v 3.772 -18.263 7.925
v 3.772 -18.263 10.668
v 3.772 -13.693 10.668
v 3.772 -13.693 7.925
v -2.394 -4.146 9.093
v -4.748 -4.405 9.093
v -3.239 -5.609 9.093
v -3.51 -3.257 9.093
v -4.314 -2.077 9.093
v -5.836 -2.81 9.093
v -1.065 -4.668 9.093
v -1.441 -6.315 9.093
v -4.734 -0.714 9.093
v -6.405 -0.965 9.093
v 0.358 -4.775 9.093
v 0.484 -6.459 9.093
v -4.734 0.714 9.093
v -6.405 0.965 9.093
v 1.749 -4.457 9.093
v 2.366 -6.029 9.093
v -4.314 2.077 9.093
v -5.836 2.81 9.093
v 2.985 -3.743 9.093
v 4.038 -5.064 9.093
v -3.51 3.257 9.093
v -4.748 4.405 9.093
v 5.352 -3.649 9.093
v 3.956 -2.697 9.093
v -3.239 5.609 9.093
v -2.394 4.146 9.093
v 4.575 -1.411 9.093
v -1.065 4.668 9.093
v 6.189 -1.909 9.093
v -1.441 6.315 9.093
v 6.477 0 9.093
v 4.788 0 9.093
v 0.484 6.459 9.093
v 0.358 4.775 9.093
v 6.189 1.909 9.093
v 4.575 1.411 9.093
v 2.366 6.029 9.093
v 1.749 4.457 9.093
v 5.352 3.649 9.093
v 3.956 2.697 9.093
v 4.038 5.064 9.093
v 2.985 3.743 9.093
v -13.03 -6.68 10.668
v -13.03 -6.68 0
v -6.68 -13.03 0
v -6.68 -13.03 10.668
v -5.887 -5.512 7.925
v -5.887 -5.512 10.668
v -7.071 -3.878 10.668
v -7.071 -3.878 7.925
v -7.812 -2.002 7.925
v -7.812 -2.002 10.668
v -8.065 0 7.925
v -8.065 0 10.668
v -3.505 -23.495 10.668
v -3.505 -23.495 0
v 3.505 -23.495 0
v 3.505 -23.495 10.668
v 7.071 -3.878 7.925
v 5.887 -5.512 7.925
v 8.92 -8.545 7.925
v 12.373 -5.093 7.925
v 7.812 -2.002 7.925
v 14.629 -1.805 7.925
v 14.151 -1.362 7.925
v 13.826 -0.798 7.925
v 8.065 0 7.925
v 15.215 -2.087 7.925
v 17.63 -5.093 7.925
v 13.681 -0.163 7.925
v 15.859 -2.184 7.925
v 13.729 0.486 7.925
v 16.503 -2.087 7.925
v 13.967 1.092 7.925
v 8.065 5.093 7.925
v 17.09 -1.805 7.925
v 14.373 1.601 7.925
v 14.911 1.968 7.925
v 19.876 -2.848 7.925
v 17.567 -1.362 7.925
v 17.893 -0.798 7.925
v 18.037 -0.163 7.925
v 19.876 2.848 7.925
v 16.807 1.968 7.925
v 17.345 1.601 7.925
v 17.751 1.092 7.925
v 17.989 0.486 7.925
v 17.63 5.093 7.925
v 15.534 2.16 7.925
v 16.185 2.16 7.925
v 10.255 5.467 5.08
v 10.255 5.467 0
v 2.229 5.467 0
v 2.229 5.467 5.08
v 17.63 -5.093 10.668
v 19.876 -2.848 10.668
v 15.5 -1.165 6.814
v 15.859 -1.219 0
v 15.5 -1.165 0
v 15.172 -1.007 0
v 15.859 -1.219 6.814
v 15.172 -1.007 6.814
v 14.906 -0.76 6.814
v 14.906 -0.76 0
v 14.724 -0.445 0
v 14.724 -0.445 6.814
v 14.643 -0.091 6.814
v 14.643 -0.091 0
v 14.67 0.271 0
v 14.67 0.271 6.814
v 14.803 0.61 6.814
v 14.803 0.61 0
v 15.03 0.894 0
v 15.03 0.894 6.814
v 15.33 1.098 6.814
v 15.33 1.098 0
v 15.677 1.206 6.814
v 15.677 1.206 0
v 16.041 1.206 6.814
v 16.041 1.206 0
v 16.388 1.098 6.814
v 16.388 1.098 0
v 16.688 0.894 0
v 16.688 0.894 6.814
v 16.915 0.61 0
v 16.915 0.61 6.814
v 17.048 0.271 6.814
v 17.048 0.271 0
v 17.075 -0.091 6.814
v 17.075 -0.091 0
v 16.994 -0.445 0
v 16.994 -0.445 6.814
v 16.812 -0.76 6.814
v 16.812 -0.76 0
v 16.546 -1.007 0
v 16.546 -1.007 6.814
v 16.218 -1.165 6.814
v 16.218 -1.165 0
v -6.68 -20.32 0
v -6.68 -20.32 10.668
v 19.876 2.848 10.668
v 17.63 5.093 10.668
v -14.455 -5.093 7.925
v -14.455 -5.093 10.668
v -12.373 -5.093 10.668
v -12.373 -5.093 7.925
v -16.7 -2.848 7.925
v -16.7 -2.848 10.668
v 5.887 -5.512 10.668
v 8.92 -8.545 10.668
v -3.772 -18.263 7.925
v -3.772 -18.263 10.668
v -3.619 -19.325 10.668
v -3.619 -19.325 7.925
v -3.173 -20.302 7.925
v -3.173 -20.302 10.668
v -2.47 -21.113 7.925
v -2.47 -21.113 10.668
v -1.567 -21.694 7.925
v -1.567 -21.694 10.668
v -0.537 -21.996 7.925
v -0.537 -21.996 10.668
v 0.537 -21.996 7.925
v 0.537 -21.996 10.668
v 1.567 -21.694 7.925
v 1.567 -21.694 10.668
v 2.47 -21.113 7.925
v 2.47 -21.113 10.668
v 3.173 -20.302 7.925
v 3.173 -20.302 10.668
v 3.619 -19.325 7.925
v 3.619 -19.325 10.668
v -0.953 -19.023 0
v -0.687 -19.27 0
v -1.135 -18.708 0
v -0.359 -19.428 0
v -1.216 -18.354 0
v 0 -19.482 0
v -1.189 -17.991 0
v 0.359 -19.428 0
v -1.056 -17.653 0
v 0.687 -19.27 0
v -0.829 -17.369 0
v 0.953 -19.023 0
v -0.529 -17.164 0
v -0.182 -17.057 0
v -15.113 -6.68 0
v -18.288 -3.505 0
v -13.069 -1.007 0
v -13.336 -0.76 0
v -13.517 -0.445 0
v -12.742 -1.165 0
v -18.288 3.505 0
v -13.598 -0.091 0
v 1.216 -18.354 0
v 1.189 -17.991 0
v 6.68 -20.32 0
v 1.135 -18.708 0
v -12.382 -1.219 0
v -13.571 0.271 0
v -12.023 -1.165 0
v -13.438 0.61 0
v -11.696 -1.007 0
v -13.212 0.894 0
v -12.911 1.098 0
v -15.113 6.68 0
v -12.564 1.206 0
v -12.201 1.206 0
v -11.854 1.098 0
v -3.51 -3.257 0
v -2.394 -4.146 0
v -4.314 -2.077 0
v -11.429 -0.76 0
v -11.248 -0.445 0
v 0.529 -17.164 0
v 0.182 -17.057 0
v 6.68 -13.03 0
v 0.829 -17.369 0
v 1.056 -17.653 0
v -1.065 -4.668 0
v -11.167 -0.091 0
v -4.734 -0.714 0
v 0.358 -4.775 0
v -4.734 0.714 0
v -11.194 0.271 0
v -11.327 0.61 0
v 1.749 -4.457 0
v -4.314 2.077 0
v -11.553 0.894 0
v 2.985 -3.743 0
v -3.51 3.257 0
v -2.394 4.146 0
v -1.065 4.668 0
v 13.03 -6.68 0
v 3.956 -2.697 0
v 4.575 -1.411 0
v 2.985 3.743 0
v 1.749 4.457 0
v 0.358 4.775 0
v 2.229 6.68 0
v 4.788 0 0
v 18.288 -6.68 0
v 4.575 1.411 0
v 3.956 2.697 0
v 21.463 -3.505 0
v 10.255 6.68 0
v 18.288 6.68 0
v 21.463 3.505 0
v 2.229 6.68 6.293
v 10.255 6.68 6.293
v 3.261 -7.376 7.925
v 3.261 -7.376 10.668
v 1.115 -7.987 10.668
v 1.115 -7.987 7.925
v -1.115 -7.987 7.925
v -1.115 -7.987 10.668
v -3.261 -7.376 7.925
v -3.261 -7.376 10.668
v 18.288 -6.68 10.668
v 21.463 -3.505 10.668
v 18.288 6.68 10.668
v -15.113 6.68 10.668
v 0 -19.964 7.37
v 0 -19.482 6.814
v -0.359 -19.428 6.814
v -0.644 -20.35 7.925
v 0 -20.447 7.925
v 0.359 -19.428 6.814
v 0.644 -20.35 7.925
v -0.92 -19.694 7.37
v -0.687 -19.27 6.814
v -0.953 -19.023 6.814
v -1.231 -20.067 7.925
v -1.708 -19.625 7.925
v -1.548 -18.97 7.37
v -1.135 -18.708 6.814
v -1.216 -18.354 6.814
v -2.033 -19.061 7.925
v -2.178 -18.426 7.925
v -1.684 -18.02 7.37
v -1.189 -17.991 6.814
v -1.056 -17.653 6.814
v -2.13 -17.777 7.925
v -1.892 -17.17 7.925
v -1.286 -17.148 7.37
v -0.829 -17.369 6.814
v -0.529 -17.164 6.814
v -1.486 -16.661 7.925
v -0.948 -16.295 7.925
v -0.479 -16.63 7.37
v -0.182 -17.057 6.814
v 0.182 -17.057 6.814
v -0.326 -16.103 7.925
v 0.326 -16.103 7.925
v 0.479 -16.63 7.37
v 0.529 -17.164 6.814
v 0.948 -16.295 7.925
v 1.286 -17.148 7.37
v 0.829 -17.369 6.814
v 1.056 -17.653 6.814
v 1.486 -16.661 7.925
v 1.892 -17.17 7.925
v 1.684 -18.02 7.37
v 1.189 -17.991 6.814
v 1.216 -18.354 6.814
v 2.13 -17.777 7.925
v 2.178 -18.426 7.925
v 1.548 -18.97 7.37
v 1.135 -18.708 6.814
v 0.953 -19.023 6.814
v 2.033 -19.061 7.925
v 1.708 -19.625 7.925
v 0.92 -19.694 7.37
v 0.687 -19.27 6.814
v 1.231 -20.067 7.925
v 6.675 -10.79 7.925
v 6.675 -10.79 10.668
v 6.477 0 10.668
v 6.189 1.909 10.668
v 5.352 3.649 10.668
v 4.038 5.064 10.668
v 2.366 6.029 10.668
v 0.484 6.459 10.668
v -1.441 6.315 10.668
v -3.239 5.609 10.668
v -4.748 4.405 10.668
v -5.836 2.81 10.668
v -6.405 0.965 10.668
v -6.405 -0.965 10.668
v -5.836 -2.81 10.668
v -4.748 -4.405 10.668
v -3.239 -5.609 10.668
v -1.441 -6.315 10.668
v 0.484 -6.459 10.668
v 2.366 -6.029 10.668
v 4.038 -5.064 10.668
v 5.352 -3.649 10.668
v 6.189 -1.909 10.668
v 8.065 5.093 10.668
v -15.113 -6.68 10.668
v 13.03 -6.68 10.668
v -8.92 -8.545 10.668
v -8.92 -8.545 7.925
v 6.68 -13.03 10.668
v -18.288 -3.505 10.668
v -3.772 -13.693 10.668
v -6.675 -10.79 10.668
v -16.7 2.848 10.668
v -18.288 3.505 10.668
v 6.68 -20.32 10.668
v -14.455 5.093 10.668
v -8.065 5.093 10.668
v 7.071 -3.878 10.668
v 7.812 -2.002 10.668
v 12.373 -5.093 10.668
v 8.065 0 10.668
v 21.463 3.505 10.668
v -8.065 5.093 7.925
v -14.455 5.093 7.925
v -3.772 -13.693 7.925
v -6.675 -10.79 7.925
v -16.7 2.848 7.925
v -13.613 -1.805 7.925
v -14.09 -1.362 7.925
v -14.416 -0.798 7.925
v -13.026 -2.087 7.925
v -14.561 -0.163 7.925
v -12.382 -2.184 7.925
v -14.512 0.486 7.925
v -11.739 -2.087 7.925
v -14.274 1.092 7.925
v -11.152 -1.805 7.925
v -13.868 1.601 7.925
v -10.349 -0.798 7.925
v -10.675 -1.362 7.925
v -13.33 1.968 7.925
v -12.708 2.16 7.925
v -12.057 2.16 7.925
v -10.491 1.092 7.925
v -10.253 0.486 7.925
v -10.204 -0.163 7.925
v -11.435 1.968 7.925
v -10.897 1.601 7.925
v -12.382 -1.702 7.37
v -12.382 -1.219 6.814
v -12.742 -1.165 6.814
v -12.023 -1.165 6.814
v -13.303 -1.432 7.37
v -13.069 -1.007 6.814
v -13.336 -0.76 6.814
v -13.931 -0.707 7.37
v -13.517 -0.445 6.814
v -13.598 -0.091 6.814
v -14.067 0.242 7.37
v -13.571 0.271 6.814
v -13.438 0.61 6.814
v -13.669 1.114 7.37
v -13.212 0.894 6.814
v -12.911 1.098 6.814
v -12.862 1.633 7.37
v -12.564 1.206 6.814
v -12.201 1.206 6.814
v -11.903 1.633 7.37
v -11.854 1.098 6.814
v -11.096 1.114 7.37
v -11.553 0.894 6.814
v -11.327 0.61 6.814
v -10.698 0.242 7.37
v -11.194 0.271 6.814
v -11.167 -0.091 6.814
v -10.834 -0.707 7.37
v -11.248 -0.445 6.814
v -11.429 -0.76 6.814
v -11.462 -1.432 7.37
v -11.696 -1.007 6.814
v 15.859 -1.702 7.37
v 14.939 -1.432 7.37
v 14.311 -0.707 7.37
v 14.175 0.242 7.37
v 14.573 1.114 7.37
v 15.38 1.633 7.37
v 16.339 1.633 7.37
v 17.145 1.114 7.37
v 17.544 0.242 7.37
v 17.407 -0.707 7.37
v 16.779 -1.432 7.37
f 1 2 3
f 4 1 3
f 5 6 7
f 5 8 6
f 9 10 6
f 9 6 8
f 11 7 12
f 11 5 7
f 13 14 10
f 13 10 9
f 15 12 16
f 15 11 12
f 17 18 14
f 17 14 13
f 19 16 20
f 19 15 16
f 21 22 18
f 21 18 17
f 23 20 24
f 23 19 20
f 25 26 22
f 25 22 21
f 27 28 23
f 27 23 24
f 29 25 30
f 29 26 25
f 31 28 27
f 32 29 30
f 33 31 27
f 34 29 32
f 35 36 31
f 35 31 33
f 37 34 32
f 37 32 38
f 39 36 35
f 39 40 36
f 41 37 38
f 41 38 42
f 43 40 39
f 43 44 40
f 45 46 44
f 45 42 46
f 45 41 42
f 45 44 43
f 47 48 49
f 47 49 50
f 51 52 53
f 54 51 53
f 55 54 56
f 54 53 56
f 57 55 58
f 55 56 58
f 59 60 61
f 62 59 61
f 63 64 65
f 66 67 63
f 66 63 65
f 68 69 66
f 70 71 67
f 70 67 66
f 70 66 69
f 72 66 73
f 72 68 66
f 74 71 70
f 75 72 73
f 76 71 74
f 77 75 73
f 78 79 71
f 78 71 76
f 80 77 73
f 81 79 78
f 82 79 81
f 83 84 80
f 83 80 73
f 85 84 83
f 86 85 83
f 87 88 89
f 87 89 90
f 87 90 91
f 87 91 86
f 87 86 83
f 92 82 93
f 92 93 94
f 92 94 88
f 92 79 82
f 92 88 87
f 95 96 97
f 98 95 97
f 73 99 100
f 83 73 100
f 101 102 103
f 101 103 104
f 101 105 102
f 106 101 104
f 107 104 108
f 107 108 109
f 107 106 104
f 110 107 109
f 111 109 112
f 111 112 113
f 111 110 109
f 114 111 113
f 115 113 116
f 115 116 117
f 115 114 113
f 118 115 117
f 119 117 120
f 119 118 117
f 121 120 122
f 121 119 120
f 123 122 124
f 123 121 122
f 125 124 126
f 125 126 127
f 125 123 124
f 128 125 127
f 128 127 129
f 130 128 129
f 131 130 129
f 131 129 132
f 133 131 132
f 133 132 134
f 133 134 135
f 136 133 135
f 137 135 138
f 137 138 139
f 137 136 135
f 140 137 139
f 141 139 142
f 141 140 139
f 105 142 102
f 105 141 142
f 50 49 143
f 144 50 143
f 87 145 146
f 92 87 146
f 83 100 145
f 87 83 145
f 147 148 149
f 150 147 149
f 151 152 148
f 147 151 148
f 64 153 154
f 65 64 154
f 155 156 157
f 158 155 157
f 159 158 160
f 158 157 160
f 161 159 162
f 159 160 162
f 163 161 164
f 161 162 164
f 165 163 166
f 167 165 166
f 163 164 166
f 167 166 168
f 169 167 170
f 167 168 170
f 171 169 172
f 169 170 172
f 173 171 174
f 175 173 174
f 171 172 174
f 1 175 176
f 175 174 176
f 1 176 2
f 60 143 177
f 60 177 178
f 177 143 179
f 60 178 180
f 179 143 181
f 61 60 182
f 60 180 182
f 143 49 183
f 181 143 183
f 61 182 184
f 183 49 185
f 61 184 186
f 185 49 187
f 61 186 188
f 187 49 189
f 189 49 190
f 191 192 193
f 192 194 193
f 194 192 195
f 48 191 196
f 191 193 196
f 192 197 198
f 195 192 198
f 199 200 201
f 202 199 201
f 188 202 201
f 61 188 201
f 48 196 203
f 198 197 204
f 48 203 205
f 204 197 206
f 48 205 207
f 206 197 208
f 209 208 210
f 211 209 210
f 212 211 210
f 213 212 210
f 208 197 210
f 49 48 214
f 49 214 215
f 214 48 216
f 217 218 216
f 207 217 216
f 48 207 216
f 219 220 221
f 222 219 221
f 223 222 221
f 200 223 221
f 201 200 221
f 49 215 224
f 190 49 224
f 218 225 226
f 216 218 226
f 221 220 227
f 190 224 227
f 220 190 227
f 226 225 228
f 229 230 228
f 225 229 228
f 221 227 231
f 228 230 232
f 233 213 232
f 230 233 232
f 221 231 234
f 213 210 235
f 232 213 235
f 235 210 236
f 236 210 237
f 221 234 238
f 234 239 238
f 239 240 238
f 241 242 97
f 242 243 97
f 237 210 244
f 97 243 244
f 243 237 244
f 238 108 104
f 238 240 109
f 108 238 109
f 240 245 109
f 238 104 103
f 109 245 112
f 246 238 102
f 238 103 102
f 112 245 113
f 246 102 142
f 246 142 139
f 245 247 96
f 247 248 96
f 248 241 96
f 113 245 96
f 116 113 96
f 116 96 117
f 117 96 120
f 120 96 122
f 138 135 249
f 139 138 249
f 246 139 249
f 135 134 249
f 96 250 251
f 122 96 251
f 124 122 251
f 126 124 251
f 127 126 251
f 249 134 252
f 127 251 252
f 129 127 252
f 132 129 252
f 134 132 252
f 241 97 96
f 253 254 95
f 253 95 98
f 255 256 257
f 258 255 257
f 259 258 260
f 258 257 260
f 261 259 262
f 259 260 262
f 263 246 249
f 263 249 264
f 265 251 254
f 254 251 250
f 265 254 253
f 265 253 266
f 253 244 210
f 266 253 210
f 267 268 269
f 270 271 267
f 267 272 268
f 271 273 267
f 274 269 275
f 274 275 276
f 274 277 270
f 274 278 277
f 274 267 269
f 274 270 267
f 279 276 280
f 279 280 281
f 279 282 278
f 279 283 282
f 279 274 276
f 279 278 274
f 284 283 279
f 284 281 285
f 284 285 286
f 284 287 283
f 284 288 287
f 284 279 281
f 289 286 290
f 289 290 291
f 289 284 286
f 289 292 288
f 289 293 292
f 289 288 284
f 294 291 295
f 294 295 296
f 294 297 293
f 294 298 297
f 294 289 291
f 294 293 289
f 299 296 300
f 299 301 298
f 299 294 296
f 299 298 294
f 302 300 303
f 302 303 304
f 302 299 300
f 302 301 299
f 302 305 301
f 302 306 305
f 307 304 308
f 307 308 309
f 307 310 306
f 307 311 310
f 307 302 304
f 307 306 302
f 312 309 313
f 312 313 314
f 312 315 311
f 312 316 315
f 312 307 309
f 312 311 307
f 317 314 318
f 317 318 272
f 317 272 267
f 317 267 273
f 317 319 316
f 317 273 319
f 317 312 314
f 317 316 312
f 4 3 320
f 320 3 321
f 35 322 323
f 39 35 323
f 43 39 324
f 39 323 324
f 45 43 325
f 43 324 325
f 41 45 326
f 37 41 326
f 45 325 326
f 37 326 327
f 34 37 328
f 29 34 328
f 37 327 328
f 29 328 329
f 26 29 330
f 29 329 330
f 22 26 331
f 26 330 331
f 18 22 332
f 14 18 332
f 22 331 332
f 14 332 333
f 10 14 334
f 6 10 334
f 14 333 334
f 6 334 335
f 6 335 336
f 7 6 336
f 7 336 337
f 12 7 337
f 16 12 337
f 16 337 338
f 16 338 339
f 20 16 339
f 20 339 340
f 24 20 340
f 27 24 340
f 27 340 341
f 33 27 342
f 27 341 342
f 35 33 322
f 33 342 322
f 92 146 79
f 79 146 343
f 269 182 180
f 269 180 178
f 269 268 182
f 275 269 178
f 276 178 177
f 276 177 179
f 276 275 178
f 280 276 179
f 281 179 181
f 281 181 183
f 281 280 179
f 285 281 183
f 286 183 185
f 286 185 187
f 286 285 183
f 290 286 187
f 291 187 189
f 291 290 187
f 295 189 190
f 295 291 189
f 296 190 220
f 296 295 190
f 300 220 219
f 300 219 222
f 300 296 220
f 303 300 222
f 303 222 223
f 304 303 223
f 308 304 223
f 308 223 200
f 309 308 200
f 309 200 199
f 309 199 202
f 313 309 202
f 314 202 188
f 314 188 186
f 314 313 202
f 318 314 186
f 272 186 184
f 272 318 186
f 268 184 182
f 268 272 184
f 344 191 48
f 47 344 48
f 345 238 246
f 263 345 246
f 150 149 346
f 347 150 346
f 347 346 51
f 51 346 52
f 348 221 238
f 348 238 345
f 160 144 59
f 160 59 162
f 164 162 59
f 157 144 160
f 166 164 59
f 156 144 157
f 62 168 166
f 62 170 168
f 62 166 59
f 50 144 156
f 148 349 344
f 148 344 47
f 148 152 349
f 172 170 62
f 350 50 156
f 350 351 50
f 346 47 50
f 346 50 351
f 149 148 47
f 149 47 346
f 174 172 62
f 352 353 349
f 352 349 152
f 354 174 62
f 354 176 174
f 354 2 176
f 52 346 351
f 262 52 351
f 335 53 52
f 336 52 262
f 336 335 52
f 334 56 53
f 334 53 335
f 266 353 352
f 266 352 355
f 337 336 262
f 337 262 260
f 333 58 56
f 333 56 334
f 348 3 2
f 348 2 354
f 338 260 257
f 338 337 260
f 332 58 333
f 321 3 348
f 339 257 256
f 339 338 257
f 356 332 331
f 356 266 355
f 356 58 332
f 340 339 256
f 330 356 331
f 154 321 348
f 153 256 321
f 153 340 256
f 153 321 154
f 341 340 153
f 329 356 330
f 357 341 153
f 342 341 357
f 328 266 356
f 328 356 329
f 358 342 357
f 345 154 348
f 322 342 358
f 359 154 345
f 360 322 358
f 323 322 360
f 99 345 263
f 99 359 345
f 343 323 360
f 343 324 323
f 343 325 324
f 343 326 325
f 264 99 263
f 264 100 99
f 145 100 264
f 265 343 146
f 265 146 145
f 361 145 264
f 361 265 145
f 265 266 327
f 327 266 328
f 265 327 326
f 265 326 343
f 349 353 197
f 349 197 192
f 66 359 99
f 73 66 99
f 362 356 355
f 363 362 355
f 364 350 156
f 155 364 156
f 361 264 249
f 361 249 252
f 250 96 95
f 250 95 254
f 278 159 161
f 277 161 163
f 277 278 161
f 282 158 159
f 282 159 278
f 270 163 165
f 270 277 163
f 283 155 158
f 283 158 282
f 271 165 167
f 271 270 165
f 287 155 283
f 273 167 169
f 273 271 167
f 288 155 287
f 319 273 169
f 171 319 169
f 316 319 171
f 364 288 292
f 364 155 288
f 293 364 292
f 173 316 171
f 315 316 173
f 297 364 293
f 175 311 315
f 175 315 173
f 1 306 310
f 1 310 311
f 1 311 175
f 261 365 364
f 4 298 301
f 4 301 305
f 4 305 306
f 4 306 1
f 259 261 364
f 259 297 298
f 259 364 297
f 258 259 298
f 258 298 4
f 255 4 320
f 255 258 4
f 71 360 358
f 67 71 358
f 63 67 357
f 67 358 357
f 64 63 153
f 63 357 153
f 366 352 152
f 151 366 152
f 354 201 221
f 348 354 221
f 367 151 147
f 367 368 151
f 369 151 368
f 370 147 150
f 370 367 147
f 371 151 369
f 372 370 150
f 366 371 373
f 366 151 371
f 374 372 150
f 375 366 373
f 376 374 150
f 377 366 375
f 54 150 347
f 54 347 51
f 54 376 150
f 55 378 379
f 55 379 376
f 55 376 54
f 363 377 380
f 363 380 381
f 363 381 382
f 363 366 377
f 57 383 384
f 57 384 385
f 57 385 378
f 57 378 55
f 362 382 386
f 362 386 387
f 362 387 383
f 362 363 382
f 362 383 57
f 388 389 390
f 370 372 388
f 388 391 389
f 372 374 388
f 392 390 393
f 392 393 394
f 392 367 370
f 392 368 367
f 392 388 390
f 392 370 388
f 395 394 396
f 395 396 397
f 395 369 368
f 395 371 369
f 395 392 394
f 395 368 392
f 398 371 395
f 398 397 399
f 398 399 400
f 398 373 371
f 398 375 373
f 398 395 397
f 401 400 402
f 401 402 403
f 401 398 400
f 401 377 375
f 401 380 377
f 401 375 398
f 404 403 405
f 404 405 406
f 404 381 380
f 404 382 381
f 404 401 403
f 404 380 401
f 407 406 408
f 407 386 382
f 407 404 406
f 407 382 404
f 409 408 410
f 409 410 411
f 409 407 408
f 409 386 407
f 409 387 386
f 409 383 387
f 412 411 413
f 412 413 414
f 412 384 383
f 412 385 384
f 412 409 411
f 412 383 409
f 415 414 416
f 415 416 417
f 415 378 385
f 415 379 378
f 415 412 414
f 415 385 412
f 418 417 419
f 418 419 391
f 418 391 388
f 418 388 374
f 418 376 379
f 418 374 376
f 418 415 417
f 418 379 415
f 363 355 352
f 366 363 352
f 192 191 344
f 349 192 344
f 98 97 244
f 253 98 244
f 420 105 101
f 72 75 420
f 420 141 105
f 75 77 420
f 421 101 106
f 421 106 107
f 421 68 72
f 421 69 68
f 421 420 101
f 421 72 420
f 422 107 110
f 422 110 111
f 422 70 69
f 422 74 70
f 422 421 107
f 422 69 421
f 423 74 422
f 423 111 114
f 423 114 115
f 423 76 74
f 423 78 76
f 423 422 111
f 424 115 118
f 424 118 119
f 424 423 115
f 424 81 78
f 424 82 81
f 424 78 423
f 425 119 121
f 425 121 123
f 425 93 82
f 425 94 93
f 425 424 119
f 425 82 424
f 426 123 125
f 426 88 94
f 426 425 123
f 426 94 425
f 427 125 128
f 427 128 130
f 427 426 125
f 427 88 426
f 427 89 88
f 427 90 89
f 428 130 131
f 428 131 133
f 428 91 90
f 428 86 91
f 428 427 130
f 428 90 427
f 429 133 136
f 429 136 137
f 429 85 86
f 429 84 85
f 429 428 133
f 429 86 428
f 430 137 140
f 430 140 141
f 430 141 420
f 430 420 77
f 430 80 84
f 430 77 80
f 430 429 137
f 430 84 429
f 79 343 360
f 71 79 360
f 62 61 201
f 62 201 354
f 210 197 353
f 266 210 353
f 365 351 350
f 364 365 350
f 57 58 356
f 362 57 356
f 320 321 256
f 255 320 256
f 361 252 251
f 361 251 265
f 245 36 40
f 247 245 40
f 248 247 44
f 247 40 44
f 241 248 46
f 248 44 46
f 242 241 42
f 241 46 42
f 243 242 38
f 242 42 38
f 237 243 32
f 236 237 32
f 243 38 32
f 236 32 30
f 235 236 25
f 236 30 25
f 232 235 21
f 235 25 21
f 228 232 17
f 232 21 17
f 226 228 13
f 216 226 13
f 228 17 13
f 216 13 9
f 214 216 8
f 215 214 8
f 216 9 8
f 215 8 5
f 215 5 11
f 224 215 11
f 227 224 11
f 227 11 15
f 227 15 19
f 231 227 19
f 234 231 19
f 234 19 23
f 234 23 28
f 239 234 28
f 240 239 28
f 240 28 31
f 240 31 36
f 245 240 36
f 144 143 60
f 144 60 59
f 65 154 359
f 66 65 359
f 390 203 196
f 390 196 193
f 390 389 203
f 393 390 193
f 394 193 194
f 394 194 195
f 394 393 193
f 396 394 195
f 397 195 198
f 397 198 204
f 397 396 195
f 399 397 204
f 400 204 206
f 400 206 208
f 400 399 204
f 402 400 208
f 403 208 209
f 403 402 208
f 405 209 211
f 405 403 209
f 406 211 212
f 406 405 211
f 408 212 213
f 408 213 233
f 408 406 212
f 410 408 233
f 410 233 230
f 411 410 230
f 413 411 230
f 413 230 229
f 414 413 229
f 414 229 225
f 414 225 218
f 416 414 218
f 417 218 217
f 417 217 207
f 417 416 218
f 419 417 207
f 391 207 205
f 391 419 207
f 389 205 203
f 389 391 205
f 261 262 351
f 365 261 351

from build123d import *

# Parameters (mm, degrees)
BOSS_EXTRUDE1_DEPTH                           = 10.668
CSK_FOR_2_FLAT_HEAD_MACHINE_SCREW1_AT_2_COUNT = 2
CSK_FOR_2_FLAT_HEAD_MACHINE_SCREW1_AT_2_PITCH = 28.241625
CSK_FOR_2_FLAT_HEAD_MACHINE_SCREW1_AT_3_COUNT = 2
CSK_FOR_2_FLAT_HEAD_MACHINE_SCREW1_AT_3_PITCH = 24.18748446
SKETCH4_R                                     = 6.477
CUT_EXTRUDE1_DEPTH                            = 1.5748
SKETCH5_R                                     = 4.7879
CUT_EXTRUDE2_DEPTH                            = 11.668
SKETCH6_W                                     = 8.0264
SKETCH6_H                                     = 10.033
CUT_EXTRUDE3_DEPTH                            = 5.08
DRAFT2_ANGLE                                  = 45
CHAMFER1_SIZE                                 = 3.175
CHAMFER2_SIZE                                 = 6.35
CUT_EXTRUDE4_DEPTH                            = 2.7432


with BuildPart() as part:
    # Sketch1 → Boss-Extrude1 (new body)
    with BuildSketch(Plane.XY):
        Polygon((21.463, 6.6802), (-18.288, 6.6802), (-18.288, -6.6802), (-6.6802, -6.6802), (-6.6802, -23.495), (6.6802, -23.495), (6.6802, -6.6802), (21.463, -6.6802), align=None)
    extrude(amount=BOSS_EXTRUDE1_DEPTH)

    # Sketch3 → CSK for #2 Flat Head Machine Screw1 (revolve, cut)
    with BuildSketch(Plane(origin=(15.859125, 0, 10.668), x_dir=(0, -1, 0), z_dir=(1, 0, 0))):
        Polygon((0, 0), (0, 10.668), (1.2192, 10.668), (1.2192, 3.853535587), (2.1844, 2.7432), (2.1844, 0), align=None)
    csk_for_2_flat_head_machine_screw1 = revolve(axis=Axis((15.859125, 0, 17.018), (0, 0, -1)), mode=Mode.SUBTRACT)

    # CSK for #2 Flat Head Machine Screw1 at 2: CSK for #2 Flat Head Machine Screw1 ×2
    with Locations(*[(-i * CSK_FOR_2_FLAT_HEAD_MACHINE_SCREW1_AT_2_PITCH, 0, 0) for i in range(1, CSK_FOR_2_FLAT_HEAD_MACHINE_SCREW1_AT_2_COUNT)]):
        add(csk_for_2_flat_head_machine_screw1, mode=Mode.SUBTRACT)

    # CSK for #2 Flat Head Machine Screw1 at 3: CSK for #2 Flat Head Machine Screw1 ×2
    with Locations(*[Vector(-0.65567484, -0.755043379, 0) * (i * CSK_FOR_2_FLAT_HEAD_MACHINE_SCREW1_AT_3_PITCH) for i in range(1, CSK_FOR_2_FLAT_HEAD_MACHINE_SCREW1_AT_3_COUNT)]):
        add(csk_for_2_flat_head_machine_screw1, mode=Mode.SUBTRACT)

    # Sketch4 → Cut-Extrude1 (cut)
    with BuildSketch(Plane.XY.offset(10.668)):
        Circle(SKETCH4_R)
    extrude(amount=-CUT_EXTRUDE1_DEPTH, mode=Mode.SUBTRACT)

    # Sketch5 → Cut-Extrude2 (cut, through all)
    with BuildSketch(Plane.XY.offset(10.668)):
        Circle(SKETCH5_R)
    extrude(amount=-CUT_EXTRUDE2_DEPTH, mode=Mode.SUBTRACT)

    # Sketch6 → Cut-Extrude3 (cut)
    with BuildSketch(Plane(origin=(0, 0, 0), x_dir=(-1, 0, 0), z_dir=(0, 0, -1))):
        with Locations((-6.24205, 10.483214746)):
            Rectangle(SKETCH6_W, SKETCH6_H)
    extrude(amount=-CUT_EXTRUDE3_DEPTH, mode=Mode.SUBTRACT)

    # Draft2
    draft2_faces = [part.faces().sort_by_distance(p)[0] for p in [
        (6.24205, 6.073457373, 5.08),
    ]]
    draft(draft2_faces, Plane(origin=(10.25525, 5.466714746, 5.08), x_dir=(1, 0, 0), z_dir=(0, 1, 0)), DRAFT2_ANGLE)

    # Chamfer1
    chamfer1_edges = [part.edges().sort_by_distance(p)[0] for p in [
        (21.463, -6.6802, 5.334),
        (6.6802, -23.495, 5.334),
        (-6.6802, -23.495, 5.334),
        (-18.288, -6.6802, 5.334),
        (-18.288, 6.6802, 5.334),
        (21.463, 6.6802, 5.334),
    ]]
    chamfer(chamfer1_edges, length=CHAMFER1_SIZE)

    # Chamfer2
    chamfer2_edges = [part.edges().sort_by_distance(p)[0] for p in [
        (6.6802, -6.6802, 5.334),
        (-6.6802, -6.6802, 5.334),
    ]]
    chamfer(chamfer2_edges, length=CHAMFER2_SIZE)

    # Sketch7 → Cut-Extrude4 (cut)
    with BuildSketch(Plane.XY.offset(10.668)):
        with BuildLine():
            Line((3.7719, -13.69343597), (6.675135951, -10.790200019))
            Line((6.675135951, -10.790200019), (3.260798724, -7.375862792))
            ThreePointArc((3.260798724, -7.375862792), (0, -8.0645), (-3.260798724, -7.375862792))
            Line((-3.260798724, -7.375862792), (-6.675135951, -10.790200019))
            Line((-6.675135951, -10.790200019), (-3.7719, -13.69343597))
            Line((-3.7719, -13.69343597), (-3.7719, -18.2626))
            ThreePointArc((-3.7719, -18.2626), (0, -22.0345), (3.7719, -18.2626))
            Line((3.7719, -18.2626), (3.7719, -13.69343597))
        make_face()
        with BuildLine():
            Line((12.37263597, -5.0927), (17.63043597, -5.0927))
            Line((17.63043597, -5.0927), (19.8755, -2.84763597))
            Line((19.8755, -2.84763597), (19.8755, 2.84763597))
            Line((19.8755, 2.84763597), (17.63043597, 5.0927))
            Line((17.63043597, 5.0927), (8.0645, 5.0927))
            Line((8.0645, 5.0927), (8.0645, 0))
            ThreePointArc((8.0645, 0), (7.500371575, -2.963205441), (5.886910197, -5.511846205))
            Line((5.886910197, -5.511846205), (8.920199981, -8.545135989))
            Line((8.920199981, -8.545135989), (12.37263597, -5.0927))
        make_face()
        with BuildLine():
            Line((-14.45543597, 5.0927), (-16.7005, 2.84763597))
            Line((-16.7005, 2.84763597), (-16.7005, -2.84763597))
            Line((-16.7005, -2.84763597), (-14.45543597, -5.0927))
            Line((-14.45543597, -5.0927), (-12.37263597, -5.0927))
            Line((-12.37263597, -5.0927), (-8.920199981, -8.545135989))
            Line((-8.920199981, -8.545135989), (-5.886910197, -5.511846205))
            ThreePointArc((-5.886910197, -5.511846205), (-7.500371575, -2.963205441), (-8.0645, 0))
            Line((-8.0645, 0), (-8.0645, 5.0927))
            Line((-8.0645, 5.0927), (-14.45543597, 5.0927))
        make_face()
    extrude(amount=-CUT_EXTRUDE4_DEPTH, mode=Mode.SUBTRACT)


solid = part.part
